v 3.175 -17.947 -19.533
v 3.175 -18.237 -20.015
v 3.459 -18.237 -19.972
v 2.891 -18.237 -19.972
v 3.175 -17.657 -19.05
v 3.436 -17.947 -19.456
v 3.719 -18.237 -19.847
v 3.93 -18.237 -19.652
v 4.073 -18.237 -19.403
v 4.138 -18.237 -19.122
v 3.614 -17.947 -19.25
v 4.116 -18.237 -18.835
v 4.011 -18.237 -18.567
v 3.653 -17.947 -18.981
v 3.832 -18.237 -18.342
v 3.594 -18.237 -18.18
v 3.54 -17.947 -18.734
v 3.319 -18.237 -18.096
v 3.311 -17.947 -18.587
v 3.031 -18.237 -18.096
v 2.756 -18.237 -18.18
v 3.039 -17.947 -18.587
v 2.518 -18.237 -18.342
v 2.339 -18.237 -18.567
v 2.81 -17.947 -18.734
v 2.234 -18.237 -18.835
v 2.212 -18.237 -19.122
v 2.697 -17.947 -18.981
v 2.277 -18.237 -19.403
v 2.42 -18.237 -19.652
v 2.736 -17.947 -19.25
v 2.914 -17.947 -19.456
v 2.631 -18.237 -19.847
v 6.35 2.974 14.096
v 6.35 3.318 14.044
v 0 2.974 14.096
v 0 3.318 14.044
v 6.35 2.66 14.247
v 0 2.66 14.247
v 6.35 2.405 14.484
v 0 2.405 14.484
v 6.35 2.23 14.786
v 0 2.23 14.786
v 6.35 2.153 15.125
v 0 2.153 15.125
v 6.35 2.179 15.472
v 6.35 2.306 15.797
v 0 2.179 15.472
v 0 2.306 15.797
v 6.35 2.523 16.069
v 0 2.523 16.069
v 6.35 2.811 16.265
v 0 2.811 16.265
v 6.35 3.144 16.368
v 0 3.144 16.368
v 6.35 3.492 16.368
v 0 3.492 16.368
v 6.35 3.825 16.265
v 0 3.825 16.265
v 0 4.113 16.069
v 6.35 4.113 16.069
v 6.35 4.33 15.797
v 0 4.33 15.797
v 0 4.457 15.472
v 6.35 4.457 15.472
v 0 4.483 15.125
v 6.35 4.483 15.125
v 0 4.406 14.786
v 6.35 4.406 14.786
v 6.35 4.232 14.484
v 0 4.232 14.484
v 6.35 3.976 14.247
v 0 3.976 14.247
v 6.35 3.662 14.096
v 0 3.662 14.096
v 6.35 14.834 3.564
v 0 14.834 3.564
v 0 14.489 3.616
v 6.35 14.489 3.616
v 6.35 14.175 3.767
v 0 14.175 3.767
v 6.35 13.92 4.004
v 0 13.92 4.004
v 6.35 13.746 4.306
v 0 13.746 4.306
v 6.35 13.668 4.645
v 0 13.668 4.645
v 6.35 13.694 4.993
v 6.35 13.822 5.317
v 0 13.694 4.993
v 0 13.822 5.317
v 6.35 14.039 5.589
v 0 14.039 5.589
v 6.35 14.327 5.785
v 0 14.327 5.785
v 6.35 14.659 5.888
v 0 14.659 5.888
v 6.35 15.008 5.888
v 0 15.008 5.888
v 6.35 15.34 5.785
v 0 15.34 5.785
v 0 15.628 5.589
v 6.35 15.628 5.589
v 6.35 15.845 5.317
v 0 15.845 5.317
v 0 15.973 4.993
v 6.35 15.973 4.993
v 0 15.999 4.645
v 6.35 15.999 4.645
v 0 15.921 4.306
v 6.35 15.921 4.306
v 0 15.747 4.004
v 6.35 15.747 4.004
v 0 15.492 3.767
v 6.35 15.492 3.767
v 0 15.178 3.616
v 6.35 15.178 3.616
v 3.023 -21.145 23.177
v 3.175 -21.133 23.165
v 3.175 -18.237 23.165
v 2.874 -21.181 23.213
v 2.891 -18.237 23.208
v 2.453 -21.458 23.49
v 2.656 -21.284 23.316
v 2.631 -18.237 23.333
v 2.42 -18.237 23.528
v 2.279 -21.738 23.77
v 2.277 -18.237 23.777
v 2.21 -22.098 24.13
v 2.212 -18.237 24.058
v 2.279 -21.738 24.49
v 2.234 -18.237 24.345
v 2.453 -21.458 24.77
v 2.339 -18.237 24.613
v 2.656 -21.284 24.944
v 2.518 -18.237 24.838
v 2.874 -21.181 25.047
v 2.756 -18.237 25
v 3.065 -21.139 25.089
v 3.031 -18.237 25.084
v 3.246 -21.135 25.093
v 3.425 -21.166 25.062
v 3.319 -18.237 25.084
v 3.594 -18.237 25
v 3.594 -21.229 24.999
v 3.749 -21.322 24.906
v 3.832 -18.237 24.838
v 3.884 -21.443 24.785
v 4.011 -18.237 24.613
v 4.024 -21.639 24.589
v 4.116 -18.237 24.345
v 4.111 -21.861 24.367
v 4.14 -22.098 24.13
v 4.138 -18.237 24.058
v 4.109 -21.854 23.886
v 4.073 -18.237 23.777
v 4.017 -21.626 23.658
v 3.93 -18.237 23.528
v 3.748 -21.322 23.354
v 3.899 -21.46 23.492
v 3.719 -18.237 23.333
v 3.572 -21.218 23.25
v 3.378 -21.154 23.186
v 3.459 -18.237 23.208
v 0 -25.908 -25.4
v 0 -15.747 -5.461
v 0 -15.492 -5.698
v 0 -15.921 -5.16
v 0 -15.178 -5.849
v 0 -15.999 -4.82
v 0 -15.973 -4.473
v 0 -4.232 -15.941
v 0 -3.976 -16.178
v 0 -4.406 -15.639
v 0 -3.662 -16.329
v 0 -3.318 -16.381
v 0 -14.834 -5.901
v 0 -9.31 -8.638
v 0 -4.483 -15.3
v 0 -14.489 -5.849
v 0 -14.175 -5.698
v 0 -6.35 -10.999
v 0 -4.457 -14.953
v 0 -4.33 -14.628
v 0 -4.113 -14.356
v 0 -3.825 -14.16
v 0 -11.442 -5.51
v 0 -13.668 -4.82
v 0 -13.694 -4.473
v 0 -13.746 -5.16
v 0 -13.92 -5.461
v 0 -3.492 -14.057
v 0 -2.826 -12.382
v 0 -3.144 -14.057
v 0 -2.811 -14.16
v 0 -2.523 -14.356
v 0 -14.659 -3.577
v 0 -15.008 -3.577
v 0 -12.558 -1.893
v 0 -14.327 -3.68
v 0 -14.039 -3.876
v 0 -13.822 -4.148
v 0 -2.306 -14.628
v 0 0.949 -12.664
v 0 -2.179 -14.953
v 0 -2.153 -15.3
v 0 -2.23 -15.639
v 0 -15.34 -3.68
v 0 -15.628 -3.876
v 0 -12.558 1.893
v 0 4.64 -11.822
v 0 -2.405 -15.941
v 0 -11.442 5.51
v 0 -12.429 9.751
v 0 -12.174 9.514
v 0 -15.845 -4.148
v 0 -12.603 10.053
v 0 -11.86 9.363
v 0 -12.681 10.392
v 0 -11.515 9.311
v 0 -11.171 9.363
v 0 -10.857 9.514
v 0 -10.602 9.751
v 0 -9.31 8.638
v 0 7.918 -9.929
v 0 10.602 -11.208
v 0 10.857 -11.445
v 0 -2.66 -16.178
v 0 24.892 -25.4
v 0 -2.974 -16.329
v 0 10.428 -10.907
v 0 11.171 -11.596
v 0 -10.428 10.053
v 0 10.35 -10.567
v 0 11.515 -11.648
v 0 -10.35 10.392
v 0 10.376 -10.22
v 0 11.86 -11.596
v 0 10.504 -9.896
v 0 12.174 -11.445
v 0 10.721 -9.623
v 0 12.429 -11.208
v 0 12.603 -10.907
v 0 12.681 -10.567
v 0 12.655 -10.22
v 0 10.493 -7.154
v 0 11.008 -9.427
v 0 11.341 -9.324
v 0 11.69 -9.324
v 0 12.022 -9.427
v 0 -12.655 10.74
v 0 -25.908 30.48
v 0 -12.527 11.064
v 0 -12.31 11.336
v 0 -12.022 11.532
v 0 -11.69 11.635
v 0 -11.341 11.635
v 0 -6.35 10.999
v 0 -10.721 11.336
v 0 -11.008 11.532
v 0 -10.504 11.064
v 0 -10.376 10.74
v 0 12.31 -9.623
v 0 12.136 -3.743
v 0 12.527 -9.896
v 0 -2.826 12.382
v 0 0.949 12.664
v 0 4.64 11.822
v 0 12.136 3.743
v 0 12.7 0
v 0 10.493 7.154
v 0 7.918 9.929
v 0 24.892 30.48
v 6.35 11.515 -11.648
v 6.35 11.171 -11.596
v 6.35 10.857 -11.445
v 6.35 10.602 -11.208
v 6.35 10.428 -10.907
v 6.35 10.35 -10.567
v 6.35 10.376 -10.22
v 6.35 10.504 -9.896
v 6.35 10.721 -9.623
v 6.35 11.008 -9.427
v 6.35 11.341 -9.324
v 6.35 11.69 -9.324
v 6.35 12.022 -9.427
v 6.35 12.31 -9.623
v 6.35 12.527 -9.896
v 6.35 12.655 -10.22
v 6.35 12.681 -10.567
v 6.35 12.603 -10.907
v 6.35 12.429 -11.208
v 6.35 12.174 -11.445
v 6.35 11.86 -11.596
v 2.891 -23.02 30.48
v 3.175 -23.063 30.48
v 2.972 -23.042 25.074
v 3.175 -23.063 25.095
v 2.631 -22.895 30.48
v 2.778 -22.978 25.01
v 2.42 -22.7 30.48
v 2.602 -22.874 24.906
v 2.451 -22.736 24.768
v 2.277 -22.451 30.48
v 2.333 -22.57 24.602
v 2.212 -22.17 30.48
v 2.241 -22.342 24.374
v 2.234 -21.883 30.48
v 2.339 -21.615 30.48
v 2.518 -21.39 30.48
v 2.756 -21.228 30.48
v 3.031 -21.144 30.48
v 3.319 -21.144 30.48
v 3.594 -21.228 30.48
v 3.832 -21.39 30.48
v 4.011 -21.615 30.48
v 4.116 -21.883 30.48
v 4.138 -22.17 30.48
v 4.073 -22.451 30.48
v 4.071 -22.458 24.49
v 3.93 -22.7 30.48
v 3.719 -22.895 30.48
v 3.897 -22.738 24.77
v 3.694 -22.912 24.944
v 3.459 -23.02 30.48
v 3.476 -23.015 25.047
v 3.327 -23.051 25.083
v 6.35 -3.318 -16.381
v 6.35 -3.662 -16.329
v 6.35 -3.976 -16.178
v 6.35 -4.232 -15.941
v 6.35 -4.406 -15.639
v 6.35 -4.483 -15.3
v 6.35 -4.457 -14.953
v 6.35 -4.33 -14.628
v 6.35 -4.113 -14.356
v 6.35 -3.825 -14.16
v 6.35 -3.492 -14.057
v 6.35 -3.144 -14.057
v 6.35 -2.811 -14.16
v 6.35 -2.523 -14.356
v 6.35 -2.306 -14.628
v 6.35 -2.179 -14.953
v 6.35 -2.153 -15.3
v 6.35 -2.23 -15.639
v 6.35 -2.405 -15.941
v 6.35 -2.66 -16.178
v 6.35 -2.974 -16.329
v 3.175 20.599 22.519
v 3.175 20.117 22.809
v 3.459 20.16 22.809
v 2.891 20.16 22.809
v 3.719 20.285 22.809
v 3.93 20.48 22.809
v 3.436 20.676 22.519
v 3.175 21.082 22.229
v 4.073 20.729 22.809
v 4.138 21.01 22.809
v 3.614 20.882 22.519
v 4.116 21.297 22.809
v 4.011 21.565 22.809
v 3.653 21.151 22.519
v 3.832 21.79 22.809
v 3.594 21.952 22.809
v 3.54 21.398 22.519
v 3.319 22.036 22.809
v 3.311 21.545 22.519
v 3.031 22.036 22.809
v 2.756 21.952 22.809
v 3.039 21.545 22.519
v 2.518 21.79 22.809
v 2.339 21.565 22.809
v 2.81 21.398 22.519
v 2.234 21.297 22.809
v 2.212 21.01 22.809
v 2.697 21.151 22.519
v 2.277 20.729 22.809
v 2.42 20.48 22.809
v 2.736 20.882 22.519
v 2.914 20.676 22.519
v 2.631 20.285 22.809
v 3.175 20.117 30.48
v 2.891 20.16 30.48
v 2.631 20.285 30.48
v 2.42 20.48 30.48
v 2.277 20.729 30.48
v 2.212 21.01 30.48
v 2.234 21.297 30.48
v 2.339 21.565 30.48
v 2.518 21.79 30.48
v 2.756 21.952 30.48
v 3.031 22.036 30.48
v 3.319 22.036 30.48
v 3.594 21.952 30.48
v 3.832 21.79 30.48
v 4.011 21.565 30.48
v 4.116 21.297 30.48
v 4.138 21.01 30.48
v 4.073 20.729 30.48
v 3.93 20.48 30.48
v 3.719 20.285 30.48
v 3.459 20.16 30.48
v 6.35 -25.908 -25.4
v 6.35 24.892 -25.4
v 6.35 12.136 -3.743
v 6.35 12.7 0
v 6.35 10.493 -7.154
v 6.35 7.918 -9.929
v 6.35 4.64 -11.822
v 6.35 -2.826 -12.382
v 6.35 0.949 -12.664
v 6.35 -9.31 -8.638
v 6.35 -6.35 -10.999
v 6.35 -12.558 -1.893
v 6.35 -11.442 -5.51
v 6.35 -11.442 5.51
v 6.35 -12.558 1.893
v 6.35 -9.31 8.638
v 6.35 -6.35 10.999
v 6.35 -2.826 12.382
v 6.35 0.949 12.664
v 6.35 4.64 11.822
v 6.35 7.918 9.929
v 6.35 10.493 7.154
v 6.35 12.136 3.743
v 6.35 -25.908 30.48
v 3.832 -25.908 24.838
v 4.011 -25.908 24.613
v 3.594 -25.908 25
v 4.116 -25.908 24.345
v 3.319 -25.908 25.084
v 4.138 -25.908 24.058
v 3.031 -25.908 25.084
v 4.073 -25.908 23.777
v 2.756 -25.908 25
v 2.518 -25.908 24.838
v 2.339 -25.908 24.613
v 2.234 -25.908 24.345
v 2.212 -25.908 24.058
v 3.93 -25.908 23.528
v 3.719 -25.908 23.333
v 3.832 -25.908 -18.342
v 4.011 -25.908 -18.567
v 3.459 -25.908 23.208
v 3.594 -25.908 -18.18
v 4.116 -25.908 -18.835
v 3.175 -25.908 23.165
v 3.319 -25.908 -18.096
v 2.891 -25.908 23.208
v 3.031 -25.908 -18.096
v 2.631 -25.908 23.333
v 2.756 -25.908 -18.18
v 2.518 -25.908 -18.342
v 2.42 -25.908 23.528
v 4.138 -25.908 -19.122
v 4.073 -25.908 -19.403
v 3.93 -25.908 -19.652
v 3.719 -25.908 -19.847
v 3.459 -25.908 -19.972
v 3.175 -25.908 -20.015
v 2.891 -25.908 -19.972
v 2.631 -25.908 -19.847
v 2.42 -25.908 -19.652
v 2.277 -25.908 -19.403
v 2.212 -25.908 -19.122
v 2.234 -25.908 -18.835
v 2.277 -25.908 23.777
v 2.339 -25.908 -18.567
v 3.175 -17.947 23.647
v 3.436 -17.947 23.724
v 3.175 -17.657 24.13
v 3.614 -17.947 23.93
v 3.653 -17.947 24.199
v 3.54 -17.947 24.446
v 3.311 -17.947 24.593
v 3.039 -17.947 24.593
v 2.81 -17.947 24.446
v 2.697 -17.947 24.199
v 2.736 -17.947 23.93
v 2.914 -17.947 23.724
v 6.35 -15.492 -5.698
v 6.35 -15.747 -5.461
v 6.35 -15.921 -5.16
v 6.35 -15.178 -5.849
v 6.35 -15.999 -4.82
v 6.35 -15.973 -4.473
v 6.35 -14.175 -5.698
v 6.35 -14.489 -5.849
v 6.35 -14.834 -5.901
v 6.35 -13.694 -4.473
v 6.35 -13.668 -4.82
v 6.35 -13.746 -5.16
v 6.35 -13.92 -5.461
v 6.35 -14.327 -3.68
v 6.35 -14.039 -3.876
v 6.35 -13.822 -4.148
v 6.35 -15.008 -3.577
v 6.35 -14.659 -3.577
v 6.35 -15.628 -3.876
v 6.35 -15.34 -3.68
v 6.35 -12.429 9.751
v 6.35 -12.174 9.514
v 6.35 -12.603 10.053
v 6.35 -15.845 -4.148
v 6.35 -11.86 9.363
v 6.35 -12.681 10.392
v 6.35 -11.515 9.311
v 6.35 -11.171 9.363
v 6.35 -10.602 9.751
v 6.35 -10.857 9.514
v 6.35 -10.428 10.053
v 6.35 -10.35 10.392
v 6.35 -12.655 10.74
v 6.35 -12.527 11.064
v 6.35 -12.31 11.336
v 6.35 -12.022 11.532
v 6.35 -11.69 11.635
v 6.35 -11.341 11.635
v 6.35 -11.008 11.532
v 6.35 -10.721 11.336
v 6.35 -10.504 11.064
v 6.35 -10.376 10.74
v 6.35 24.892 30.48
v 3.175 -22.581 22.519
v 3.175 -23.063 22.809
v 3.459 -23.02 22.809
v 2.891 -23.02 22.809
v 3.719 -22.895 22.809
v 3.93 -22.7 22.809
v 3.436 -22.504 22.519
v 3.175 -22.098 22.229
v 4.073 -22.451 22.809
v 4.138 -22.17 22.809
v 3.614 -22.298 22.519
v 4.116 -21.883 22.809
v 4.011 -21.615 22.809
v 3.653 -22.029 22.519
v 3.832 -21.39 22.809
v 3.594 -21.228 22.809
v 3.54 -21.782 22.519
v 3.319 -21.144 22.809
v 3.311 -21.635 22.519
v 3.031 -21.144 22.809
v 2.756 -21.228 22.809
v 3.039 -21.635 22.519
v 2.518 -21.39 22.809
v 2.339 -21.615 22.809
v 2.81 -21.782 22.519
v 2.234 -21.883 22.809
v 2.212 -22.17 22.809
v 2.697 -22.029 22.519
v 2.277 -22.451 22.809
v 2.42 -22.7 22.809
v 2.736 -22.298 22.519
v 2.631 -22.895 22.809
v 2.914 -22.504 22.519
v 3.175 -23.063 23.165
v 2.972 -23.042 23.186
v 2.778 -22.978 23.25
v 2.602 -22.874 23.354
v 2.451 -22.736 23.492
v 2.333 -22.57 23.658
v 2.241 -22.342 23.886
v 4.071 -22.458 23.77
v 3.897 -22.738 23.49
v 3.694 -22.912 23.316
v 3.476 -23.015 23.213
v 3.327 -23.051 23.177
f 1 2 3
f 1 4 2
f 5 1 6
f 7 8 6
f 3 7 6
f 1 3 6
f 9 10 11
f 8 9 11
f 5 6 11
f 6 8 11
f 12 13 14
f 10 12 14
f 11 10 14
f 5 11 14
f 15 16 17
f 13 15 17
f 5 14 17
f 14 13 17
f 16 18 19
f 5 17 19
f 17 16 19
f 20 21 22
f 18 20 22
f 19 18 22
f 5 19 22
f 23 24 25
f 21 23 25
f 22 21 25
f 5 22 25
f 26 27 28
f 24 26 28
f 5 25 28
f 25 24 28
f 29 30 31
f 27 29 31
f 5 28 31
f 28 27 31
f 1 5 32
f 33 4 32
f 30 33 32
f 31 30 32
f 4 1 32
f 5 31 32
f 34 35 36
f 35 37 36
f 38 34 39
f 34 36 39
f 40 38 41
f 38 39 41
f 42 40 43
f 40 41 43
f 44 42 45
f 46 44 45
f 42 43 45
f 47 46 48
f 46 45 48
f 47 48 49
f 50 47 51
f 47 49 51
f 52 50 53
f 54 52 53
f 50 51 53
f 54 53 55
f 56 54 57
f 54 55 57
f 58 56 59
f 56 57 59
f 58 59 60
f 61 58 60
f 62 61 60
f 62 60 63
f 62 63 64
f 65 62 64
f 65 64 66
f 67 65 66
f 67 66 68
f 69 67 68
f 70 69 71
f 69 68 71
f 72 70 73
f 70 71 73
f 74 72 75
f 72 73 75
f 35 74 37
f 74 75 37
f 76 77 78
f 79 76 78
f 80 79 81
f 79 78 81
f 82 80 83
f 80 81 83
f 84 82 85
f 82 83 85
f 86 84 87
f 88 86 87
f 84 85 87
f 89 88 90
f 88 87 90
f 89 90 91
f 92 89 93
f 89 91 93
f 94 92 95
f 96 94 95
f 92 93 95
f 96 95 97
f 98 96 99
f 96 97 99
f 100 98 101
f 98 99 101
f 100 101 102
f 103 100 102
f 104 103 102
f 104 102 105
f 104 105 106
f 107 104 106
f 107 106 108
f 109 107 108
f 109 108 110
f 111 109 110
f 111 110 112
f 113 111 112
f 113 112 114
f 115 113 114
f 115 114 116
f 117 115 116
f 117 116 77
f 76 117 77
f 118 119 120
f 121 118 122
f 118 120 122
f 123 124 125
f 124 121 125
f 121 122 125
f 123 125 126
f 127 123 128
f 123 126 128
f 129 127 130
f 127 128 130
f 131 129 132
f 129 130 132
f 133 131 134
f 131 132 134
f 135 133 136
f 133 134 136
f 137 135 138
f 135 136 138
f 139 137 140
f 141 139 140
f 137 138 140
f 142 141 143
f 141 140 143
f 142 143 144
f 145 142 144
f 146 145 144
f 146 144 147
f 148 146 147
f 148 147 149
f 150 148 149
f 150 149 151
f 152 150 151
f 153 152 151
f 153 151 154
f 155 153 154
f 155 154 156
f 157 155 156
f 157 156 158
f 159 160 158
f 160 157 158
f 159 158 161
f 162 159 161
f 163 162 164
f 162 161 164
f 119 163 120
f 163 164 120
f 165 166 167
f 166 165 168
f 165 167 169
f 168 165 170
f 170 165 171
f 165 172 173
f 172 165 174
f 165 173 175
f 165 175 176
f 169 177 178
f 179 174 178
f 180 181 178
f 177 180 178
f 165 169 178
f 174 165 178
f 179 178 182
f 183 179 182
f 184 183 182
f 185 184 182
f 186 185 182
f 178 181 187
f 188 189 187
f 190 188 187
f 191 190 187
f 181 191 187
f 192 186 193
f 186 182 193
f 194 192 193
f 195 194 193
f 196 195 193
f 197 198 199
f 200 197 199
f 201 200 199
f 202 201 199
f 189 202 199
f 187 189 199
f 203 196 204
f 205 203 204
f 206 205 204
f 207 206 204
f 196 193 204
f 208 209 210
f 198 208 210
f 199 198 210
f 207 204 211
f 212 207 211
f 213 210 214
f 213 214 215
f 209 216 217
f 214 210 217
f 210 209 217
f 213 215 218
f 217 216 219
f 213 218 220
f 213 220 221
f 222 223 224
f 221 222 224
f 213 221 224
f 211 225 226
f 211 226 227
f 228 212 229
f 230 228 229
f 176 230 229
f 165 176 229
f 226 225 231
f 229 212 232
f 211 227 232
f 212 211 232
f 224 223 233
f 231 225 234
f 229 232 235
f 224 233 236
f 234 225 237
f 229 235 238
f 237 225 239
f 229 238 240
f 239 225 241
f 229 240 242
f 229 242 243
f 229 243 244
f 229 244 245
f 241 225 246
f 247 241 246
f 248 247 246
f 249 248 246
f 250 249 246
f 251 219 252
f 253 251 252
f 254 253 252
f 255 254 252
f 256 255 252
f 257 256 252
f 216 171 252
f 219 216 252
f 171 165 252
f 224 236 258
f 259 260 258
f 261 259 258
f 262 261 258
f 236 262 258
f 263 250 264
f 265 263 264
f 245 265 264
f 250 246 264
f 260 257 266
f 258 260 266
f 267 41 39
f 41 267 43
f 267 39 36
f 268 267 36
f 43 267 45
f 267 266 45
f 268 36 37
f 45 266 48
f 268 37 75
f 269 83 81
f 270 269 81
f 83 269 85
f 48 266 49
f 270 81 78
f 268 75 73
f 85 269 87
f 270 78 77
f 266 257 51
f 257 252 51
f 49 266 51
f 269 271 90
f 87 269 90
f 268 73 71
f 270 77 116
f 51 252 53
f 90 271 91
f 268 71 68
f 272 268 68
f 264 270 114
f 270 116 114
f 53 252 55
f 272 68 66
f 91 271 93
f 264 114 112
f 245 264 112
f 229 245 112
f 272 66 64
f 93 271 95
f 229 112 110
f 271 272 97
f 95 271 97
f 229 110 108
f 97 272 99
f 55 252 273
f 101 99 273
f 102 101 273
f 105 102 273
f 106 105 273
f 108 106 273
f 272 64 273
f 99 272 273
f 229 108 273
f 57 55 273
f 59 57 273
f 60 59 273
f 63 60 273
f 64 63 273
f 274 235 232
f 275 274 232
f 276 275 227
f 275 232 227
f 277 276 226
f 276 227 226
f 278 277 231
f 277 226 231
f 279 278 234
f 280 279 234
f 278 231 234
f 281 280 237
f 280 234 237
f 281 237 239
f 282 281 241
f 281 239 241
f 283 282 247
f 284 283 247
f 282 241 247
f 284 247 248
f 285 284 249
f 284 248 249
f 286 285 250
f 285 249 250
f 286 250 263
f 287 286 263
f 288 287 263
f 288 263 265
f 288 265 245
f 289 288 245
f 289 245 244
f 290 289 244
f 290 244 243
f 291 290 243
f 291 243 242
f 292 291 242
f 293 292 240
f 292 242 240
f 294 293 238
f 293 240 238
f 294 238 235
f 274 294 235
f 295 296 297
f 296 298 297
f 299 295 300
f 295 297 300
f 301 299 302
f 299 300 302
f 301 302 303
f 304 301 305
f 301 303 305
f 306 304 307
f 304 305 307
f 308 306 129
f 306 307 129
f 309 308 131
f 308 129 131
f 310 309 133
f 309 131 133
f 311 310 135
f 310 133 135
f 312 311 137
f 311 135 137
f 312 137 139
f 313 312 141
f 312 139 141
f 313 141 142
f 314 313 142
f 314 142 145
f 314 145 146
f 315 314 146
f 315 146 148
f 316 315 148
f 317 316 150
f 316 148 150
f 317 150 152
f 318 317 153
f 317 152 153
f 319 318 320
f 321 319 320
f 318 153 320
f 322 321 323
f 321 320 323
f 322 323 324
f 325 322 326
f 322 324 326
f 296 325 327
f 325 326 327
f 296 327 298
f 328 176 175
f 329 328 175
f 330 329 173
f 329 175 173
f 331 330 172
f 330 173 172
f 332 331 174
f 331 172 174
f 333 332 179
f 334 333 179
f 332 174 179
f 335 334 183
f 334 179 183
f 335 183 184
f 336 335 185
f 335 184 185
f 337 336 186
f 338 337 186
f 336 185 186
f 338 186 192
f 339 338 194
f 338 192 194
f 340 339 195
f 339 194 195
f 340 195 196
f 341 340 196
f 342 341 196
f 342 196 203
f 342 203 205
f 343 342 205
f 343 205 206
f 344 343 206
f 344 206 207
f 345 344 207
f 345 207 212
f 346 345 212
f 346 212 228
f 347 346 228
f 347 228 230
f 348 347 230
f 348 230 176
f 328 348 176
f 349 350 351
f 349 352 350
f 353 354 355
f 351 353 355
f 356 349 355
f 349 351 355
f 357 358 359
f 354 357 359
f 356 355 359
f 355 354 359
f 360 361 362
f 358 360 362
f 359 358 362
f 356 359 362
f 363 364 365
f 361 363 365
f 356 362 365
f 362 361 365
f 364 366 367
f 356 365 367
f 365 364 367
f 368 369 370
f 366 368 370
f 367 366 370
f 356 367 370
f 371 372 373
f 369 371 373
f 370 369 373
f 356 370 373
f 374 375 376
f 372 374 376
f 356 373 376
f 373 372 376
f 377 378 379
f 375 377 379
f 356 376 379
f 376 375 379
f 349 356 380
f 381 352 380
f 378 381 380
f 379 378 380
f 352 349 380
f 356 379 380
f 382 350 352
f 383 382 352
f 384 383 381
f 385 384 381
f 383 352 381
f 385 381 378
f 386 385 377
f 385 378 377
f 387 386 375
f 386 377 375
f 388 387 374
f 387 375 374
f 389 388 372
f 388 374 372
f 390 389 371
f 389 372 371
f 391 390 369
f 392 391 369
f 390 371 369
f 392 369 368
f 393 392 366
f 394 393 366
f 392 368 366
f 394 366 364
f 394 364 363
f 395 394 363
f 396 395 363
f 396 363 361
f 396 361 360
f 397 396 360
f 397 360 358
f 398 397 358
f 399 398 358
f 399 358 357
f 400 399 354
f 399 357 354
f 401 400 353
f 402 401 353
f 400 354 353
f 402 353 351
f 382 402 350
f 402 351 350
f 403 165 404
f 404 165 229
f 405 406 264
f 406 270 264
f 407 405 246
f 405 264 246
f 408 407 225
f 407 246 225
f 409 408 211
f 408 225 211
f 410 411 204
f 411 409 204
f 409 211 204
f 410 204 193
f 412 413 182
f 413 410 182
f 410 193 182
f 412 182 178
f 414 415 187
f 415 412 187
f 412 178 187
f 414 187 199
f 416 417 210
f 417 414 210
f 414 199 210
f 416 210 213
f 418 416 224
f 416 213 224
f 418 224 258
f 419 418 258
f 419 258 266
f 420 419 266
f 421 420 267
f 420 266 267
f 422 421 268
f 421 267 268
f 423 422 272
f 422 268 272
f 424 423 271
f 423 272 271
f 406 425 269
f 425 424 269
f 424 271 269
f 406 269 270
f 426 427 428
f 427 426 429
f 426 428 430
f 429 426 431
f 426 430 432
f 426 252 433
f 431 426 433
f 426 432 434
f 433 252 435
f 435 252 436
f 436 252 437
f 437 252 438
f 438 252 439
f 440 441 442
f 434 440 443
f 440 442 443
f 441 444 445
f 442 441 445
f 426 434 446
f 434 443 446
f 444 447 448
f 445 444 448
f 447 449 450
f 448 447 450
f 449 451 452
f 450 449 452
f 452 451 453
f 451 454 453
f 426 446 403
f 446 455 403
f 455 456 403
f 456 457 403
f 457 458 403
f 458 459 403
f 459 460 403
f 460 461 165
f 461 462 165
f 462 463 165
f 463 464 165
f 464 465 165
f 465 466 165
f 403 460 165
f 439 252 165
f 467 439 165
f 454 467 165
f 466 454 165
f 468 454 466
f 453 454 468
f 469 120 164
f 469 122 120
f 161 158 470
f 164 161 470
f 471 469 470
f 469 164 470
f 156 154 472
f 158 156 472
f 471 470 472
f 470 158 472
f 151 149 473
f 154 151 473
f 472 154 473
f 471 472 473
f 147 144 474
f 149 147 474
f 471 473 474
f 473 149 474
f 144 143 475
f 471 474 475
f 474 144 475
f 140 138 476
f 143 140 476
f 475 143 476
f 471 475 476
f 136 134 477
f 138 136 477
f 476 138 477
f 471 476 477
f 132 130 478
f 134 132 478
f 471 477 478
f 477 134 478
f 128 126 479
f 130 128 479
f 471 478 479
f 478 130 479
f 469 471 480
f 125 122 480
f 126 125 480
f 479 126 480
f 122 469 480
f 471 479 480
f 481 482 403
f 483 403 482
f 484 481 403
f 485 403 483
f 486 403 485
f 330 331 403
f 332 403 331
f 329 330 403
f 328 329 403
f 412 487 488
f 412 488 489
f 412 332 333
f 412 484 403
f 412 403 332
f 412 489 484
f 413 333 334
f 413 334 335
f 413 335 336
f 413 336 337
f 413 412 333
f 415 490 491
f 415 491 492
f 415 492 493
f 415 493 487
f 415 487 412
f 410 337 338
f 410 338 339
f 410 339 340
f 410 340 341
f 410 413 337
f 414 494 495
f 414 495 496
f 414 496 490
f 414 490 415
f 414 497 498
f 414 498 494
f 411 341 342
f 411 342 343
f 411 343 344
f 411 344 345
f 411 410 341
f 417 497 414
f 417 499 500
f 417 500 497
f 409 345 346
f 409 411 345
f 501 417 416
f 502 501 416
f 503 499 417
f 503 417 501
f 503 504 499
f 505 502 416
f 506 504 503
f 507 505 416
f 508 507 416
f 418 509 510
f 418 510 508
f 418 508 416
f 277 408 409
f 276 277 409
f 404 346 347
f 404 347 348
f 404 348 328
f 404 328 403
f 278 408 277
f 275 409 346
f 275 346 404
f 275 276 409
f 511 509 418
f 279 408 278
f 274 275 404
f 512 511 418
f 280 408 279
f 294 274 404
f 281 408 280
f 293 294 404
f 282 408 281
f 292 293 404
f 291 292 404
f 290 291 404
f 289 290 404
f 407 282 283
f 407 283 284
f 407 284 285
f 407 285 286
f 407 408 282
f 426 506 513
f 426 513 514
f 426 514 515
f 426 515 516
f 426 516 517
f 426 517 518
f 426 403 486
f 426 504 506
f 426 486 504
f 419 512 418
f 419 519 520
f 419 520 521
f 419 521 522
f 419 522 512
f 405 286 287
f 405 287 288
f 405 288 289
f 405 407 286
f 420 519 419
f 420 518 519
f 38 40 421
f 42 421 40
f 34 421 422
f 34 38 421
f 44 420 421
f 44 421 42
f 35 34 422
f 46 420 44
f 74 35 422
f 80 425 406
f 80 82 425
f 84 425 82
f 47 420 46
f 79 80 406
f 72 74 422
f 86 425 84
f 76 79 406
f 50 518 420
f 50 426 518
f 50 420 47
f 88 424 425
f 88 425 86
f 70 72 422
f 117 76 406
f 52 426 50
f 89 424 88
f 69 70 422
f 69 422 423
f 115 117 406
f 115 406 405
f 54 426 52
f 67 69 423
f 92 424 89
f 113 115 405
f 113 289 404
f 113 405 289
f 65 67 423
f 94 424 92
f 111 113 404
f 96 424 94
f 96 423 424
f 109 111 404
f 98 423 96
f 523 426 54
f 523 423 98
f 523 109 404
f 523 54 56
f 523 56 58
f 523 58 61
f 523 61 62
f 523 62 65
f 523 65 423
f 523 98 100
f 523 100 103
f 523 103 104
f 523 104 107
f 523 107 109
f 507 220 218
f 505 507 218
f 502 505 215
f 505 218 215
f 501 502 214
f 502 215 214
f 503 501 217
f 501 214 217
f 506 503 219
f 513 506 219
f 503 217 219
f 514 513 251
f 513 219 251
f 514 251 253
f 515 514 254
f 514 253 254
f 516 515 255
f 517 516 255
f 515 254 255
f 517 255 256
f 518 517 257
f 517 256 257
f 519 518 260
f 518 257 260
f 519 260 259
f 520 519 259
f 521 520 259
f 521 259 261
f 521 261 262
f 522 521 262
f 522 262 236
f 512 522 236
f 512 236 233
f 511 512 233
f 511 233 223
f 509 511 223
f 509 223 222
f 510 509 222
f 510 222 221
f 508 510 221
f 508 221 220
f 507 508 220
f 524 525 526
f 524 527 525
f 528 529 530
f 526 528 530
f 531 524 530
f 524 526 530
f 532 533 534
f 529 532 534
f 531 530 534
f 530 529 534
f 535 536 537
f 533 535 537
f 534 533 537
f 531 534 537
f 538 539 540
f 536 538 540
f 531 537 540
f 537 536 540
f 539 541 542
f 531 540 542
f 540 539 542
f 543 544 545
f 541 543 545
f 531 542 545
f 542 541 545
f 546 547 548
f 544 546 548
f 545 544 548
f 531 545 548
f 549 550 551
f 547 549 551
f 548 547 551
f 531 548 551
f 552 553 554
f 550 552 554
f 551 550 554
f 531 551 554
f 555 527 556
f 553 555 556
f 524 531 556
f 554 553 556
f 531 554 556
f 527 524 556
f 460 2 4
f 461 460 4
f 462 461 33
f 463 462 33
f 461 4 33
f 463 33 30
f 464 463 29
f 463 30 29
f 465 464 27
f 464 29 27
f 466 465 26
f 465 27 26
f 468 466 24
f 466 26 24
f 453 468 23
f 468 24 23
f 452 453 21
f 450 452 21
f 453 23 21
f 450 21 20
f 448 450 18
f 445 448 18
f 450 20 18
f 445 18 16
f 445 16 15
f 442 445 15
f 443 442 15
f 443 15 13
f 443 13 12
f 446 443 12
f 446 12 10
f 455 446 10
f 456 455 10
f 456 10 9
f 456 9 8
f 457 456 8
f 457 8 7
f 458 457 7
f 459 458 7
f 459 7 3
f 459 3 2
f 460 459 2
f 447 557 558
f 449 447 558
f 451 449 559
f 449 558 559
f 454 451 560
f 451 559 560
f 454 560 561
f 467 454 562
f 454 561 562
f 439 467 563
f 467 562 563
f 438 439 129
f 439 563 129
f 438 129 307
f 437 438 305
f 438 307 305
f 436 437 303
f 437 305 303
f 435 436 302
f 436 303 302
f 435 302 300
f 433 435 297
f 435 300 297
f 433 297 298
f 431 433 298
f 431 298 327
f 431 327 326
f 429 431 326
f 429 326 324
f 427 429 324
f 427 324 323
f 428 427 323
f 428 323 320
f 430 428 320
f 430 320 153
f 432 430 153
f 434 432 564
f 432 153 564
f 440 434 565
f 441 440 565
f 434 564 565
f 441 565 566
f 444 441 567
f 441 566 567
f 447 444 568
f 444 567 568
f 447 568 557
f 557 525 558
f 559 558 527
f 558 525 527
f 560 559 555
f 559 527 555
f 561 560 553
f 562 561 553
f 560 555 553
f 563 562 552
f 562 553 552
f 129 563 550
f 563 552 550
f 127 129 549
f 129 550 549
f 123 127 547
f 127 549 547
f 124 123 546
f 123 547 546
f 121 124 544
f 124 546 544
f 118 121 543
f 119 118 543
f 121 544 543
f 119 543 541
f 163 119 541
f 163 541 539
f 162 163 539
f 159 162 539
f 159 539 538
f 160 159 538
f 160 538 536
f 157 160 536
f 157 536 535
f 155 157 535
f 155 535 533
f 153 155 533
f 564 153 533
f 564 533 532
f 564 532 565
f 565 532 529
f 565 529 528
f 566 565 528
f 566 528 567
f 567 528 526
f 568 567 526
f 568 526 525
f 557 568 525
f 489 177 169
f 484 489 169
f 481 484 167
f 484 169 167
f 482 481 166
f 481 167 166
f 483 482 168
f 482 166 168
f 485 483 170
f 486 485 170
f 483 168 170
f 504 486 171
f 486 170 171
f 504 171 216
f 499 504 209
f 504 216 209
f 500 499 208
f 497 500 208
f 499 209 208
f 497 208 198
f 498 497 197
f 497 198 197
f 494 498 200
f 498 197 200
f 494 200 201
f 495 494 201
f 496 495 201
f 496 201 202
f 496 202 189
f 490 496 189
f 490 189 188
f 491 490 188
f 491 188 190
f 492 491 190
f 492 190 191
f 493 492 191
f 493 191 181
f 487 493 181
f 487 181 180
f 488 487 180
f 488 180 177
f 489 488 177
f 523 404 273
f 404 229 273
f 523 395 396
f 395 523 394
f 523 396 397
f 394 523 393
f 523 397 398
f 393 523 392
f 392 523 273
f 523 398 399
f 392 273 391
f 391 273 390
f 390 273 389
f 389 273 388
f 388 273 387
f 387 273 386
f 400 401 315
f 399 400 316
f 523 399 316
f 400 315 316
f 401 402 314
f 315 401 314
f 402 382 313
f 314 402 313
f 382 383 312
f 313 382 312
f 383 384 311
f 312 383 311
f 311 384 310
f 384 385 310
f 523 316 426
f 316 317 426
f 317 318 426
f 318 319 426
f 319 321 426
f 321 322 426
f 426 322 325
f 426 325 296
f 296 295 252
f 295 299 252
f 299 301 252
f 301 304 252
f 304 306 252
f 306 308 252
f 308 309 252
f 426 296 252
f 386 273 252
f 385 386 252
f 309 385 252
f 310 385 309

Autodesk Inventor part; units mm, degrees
ref_plane "YZ Plane" through (0, 0, 0) normal (1, 0, 0) x (0, 1, 0)
ref_plane "XZ Plane" through (0, 0, 0) normal (0, 1, 0) x (-1, 0, 0)
ref_plane "XY Plane" through (0, 0, 0) normal (0, 0, 1) x (1, 0, 0)
sketch "Sketch1" plane through (0, 0, 0) normal (1, 0, 0) x (0, 1, 0)
  circle A0 centre (0, 0) radius 12.7
  line L0 (24.892, 30.48) -> (-25.908, 30.48)
  line L1 (-25.908, 30.48) -> (-25.908, -25.4)
  line L2 (-25.908, -25.4) -> (24.892, -25.4)
  line L3 (24.892, -25.4) -> (24.892, 30.48)
  dimension "d0" = 25.4
  dimension "d1" = 55.88
  dimension "d4" = 25.4
  dimension "d5" = 24.892
  dimension "d6" = 50.8
extrude "Extrusion1" add sketch "Sketch1" along normal blind 6.35
sketch "Sketch2" plane through (0, -25.908, 30.48) normal (0, 0, 1) x (1, 0, 0)
  line L0 (0, 50.8) -> (0, 0) projected
  line L1 (0, 0) -> (6.35, 0) projected
  line L2 (6.35, 50.8) -> (6.35, 0) projected
  line L3 (0, 50.8) -> (6.35, 50.8) projected
  point P0 (0, 25.908)
  point P1 (3.175, 46.99)
  point P2 (3.175, 3.81)
  dimension "d9" = 6.35
  dimension "d10" = 3.175
  dimension "d11" = 3.175
  dimension "d12" = 3.81
  dimension "d13" = 3.81
hole "Hole1" at (3.175, 21.082, 30.48) at (3.175, -22.098, 30.48) direction (0, 0, -1) diameter 1.9304 depth 7.6708 tip angle 118
sketch "Sketch3" plane through (6.35, 0, 0) normal (1, 0, 0) x (0, 0, -1)
  point P0 (0, 0)
  point P1 (10.4798, 11.5154)
  point P2 (-4.7327, 14.8335)
  point P3 (-15.2125, 3.3181)
  point P4 (-10.4798, -11.5154)
  point P5 (4.7327, -14.8335)
  point P6 (15.2125, -3.3181)
  dimension "d21" = 15.5702
  dimension "d24" = 360
hole "Hole2" at (6.35, 11.5154, -10.4798) at (6.35, 14.8335, 4.7327) at (6.35, 3.3181, 15.2125) at (6.35, -11.5154, 10.4798) at (6.35, -14.8335, -4.7327) at (6.35, -3.3181, -15.2125) direction (-1, 0, 0) diameter 2.3368 end through all
sketch "Sketch5" plane through (0, -25.908, -25.4) normal (0, -1, 0) x (1, 0, 0)
  line L0 (0, 55.88) -> (0, 0) projected
  line L1 (0, 0) -> (6.35, 0) projected
  line L2 (6.35, 55.88) -> (6.35, 0) projected
  line L3 (0, 55.88) -> (6.35, 55.88) projected
  point P0 (0, 25.4)
  point P1 (3.175, 6.35)
  point P2 (3.175, 49.53)
  dimension "d42" = 6.35
  dimension "d43" = 6.35
hole "Hole4" at (3.175, -25.908, -19.05) at (3.175, -25.908, 24.13) direction (0, 1, 0) diameter 1.9304 depth 7.6708 tip angle 118
equation "\"d10\" = 0.5 * d9"
equation "\"d11\" = d10"
equation "\"d13\" = d12"
properties part number "motor mount"
